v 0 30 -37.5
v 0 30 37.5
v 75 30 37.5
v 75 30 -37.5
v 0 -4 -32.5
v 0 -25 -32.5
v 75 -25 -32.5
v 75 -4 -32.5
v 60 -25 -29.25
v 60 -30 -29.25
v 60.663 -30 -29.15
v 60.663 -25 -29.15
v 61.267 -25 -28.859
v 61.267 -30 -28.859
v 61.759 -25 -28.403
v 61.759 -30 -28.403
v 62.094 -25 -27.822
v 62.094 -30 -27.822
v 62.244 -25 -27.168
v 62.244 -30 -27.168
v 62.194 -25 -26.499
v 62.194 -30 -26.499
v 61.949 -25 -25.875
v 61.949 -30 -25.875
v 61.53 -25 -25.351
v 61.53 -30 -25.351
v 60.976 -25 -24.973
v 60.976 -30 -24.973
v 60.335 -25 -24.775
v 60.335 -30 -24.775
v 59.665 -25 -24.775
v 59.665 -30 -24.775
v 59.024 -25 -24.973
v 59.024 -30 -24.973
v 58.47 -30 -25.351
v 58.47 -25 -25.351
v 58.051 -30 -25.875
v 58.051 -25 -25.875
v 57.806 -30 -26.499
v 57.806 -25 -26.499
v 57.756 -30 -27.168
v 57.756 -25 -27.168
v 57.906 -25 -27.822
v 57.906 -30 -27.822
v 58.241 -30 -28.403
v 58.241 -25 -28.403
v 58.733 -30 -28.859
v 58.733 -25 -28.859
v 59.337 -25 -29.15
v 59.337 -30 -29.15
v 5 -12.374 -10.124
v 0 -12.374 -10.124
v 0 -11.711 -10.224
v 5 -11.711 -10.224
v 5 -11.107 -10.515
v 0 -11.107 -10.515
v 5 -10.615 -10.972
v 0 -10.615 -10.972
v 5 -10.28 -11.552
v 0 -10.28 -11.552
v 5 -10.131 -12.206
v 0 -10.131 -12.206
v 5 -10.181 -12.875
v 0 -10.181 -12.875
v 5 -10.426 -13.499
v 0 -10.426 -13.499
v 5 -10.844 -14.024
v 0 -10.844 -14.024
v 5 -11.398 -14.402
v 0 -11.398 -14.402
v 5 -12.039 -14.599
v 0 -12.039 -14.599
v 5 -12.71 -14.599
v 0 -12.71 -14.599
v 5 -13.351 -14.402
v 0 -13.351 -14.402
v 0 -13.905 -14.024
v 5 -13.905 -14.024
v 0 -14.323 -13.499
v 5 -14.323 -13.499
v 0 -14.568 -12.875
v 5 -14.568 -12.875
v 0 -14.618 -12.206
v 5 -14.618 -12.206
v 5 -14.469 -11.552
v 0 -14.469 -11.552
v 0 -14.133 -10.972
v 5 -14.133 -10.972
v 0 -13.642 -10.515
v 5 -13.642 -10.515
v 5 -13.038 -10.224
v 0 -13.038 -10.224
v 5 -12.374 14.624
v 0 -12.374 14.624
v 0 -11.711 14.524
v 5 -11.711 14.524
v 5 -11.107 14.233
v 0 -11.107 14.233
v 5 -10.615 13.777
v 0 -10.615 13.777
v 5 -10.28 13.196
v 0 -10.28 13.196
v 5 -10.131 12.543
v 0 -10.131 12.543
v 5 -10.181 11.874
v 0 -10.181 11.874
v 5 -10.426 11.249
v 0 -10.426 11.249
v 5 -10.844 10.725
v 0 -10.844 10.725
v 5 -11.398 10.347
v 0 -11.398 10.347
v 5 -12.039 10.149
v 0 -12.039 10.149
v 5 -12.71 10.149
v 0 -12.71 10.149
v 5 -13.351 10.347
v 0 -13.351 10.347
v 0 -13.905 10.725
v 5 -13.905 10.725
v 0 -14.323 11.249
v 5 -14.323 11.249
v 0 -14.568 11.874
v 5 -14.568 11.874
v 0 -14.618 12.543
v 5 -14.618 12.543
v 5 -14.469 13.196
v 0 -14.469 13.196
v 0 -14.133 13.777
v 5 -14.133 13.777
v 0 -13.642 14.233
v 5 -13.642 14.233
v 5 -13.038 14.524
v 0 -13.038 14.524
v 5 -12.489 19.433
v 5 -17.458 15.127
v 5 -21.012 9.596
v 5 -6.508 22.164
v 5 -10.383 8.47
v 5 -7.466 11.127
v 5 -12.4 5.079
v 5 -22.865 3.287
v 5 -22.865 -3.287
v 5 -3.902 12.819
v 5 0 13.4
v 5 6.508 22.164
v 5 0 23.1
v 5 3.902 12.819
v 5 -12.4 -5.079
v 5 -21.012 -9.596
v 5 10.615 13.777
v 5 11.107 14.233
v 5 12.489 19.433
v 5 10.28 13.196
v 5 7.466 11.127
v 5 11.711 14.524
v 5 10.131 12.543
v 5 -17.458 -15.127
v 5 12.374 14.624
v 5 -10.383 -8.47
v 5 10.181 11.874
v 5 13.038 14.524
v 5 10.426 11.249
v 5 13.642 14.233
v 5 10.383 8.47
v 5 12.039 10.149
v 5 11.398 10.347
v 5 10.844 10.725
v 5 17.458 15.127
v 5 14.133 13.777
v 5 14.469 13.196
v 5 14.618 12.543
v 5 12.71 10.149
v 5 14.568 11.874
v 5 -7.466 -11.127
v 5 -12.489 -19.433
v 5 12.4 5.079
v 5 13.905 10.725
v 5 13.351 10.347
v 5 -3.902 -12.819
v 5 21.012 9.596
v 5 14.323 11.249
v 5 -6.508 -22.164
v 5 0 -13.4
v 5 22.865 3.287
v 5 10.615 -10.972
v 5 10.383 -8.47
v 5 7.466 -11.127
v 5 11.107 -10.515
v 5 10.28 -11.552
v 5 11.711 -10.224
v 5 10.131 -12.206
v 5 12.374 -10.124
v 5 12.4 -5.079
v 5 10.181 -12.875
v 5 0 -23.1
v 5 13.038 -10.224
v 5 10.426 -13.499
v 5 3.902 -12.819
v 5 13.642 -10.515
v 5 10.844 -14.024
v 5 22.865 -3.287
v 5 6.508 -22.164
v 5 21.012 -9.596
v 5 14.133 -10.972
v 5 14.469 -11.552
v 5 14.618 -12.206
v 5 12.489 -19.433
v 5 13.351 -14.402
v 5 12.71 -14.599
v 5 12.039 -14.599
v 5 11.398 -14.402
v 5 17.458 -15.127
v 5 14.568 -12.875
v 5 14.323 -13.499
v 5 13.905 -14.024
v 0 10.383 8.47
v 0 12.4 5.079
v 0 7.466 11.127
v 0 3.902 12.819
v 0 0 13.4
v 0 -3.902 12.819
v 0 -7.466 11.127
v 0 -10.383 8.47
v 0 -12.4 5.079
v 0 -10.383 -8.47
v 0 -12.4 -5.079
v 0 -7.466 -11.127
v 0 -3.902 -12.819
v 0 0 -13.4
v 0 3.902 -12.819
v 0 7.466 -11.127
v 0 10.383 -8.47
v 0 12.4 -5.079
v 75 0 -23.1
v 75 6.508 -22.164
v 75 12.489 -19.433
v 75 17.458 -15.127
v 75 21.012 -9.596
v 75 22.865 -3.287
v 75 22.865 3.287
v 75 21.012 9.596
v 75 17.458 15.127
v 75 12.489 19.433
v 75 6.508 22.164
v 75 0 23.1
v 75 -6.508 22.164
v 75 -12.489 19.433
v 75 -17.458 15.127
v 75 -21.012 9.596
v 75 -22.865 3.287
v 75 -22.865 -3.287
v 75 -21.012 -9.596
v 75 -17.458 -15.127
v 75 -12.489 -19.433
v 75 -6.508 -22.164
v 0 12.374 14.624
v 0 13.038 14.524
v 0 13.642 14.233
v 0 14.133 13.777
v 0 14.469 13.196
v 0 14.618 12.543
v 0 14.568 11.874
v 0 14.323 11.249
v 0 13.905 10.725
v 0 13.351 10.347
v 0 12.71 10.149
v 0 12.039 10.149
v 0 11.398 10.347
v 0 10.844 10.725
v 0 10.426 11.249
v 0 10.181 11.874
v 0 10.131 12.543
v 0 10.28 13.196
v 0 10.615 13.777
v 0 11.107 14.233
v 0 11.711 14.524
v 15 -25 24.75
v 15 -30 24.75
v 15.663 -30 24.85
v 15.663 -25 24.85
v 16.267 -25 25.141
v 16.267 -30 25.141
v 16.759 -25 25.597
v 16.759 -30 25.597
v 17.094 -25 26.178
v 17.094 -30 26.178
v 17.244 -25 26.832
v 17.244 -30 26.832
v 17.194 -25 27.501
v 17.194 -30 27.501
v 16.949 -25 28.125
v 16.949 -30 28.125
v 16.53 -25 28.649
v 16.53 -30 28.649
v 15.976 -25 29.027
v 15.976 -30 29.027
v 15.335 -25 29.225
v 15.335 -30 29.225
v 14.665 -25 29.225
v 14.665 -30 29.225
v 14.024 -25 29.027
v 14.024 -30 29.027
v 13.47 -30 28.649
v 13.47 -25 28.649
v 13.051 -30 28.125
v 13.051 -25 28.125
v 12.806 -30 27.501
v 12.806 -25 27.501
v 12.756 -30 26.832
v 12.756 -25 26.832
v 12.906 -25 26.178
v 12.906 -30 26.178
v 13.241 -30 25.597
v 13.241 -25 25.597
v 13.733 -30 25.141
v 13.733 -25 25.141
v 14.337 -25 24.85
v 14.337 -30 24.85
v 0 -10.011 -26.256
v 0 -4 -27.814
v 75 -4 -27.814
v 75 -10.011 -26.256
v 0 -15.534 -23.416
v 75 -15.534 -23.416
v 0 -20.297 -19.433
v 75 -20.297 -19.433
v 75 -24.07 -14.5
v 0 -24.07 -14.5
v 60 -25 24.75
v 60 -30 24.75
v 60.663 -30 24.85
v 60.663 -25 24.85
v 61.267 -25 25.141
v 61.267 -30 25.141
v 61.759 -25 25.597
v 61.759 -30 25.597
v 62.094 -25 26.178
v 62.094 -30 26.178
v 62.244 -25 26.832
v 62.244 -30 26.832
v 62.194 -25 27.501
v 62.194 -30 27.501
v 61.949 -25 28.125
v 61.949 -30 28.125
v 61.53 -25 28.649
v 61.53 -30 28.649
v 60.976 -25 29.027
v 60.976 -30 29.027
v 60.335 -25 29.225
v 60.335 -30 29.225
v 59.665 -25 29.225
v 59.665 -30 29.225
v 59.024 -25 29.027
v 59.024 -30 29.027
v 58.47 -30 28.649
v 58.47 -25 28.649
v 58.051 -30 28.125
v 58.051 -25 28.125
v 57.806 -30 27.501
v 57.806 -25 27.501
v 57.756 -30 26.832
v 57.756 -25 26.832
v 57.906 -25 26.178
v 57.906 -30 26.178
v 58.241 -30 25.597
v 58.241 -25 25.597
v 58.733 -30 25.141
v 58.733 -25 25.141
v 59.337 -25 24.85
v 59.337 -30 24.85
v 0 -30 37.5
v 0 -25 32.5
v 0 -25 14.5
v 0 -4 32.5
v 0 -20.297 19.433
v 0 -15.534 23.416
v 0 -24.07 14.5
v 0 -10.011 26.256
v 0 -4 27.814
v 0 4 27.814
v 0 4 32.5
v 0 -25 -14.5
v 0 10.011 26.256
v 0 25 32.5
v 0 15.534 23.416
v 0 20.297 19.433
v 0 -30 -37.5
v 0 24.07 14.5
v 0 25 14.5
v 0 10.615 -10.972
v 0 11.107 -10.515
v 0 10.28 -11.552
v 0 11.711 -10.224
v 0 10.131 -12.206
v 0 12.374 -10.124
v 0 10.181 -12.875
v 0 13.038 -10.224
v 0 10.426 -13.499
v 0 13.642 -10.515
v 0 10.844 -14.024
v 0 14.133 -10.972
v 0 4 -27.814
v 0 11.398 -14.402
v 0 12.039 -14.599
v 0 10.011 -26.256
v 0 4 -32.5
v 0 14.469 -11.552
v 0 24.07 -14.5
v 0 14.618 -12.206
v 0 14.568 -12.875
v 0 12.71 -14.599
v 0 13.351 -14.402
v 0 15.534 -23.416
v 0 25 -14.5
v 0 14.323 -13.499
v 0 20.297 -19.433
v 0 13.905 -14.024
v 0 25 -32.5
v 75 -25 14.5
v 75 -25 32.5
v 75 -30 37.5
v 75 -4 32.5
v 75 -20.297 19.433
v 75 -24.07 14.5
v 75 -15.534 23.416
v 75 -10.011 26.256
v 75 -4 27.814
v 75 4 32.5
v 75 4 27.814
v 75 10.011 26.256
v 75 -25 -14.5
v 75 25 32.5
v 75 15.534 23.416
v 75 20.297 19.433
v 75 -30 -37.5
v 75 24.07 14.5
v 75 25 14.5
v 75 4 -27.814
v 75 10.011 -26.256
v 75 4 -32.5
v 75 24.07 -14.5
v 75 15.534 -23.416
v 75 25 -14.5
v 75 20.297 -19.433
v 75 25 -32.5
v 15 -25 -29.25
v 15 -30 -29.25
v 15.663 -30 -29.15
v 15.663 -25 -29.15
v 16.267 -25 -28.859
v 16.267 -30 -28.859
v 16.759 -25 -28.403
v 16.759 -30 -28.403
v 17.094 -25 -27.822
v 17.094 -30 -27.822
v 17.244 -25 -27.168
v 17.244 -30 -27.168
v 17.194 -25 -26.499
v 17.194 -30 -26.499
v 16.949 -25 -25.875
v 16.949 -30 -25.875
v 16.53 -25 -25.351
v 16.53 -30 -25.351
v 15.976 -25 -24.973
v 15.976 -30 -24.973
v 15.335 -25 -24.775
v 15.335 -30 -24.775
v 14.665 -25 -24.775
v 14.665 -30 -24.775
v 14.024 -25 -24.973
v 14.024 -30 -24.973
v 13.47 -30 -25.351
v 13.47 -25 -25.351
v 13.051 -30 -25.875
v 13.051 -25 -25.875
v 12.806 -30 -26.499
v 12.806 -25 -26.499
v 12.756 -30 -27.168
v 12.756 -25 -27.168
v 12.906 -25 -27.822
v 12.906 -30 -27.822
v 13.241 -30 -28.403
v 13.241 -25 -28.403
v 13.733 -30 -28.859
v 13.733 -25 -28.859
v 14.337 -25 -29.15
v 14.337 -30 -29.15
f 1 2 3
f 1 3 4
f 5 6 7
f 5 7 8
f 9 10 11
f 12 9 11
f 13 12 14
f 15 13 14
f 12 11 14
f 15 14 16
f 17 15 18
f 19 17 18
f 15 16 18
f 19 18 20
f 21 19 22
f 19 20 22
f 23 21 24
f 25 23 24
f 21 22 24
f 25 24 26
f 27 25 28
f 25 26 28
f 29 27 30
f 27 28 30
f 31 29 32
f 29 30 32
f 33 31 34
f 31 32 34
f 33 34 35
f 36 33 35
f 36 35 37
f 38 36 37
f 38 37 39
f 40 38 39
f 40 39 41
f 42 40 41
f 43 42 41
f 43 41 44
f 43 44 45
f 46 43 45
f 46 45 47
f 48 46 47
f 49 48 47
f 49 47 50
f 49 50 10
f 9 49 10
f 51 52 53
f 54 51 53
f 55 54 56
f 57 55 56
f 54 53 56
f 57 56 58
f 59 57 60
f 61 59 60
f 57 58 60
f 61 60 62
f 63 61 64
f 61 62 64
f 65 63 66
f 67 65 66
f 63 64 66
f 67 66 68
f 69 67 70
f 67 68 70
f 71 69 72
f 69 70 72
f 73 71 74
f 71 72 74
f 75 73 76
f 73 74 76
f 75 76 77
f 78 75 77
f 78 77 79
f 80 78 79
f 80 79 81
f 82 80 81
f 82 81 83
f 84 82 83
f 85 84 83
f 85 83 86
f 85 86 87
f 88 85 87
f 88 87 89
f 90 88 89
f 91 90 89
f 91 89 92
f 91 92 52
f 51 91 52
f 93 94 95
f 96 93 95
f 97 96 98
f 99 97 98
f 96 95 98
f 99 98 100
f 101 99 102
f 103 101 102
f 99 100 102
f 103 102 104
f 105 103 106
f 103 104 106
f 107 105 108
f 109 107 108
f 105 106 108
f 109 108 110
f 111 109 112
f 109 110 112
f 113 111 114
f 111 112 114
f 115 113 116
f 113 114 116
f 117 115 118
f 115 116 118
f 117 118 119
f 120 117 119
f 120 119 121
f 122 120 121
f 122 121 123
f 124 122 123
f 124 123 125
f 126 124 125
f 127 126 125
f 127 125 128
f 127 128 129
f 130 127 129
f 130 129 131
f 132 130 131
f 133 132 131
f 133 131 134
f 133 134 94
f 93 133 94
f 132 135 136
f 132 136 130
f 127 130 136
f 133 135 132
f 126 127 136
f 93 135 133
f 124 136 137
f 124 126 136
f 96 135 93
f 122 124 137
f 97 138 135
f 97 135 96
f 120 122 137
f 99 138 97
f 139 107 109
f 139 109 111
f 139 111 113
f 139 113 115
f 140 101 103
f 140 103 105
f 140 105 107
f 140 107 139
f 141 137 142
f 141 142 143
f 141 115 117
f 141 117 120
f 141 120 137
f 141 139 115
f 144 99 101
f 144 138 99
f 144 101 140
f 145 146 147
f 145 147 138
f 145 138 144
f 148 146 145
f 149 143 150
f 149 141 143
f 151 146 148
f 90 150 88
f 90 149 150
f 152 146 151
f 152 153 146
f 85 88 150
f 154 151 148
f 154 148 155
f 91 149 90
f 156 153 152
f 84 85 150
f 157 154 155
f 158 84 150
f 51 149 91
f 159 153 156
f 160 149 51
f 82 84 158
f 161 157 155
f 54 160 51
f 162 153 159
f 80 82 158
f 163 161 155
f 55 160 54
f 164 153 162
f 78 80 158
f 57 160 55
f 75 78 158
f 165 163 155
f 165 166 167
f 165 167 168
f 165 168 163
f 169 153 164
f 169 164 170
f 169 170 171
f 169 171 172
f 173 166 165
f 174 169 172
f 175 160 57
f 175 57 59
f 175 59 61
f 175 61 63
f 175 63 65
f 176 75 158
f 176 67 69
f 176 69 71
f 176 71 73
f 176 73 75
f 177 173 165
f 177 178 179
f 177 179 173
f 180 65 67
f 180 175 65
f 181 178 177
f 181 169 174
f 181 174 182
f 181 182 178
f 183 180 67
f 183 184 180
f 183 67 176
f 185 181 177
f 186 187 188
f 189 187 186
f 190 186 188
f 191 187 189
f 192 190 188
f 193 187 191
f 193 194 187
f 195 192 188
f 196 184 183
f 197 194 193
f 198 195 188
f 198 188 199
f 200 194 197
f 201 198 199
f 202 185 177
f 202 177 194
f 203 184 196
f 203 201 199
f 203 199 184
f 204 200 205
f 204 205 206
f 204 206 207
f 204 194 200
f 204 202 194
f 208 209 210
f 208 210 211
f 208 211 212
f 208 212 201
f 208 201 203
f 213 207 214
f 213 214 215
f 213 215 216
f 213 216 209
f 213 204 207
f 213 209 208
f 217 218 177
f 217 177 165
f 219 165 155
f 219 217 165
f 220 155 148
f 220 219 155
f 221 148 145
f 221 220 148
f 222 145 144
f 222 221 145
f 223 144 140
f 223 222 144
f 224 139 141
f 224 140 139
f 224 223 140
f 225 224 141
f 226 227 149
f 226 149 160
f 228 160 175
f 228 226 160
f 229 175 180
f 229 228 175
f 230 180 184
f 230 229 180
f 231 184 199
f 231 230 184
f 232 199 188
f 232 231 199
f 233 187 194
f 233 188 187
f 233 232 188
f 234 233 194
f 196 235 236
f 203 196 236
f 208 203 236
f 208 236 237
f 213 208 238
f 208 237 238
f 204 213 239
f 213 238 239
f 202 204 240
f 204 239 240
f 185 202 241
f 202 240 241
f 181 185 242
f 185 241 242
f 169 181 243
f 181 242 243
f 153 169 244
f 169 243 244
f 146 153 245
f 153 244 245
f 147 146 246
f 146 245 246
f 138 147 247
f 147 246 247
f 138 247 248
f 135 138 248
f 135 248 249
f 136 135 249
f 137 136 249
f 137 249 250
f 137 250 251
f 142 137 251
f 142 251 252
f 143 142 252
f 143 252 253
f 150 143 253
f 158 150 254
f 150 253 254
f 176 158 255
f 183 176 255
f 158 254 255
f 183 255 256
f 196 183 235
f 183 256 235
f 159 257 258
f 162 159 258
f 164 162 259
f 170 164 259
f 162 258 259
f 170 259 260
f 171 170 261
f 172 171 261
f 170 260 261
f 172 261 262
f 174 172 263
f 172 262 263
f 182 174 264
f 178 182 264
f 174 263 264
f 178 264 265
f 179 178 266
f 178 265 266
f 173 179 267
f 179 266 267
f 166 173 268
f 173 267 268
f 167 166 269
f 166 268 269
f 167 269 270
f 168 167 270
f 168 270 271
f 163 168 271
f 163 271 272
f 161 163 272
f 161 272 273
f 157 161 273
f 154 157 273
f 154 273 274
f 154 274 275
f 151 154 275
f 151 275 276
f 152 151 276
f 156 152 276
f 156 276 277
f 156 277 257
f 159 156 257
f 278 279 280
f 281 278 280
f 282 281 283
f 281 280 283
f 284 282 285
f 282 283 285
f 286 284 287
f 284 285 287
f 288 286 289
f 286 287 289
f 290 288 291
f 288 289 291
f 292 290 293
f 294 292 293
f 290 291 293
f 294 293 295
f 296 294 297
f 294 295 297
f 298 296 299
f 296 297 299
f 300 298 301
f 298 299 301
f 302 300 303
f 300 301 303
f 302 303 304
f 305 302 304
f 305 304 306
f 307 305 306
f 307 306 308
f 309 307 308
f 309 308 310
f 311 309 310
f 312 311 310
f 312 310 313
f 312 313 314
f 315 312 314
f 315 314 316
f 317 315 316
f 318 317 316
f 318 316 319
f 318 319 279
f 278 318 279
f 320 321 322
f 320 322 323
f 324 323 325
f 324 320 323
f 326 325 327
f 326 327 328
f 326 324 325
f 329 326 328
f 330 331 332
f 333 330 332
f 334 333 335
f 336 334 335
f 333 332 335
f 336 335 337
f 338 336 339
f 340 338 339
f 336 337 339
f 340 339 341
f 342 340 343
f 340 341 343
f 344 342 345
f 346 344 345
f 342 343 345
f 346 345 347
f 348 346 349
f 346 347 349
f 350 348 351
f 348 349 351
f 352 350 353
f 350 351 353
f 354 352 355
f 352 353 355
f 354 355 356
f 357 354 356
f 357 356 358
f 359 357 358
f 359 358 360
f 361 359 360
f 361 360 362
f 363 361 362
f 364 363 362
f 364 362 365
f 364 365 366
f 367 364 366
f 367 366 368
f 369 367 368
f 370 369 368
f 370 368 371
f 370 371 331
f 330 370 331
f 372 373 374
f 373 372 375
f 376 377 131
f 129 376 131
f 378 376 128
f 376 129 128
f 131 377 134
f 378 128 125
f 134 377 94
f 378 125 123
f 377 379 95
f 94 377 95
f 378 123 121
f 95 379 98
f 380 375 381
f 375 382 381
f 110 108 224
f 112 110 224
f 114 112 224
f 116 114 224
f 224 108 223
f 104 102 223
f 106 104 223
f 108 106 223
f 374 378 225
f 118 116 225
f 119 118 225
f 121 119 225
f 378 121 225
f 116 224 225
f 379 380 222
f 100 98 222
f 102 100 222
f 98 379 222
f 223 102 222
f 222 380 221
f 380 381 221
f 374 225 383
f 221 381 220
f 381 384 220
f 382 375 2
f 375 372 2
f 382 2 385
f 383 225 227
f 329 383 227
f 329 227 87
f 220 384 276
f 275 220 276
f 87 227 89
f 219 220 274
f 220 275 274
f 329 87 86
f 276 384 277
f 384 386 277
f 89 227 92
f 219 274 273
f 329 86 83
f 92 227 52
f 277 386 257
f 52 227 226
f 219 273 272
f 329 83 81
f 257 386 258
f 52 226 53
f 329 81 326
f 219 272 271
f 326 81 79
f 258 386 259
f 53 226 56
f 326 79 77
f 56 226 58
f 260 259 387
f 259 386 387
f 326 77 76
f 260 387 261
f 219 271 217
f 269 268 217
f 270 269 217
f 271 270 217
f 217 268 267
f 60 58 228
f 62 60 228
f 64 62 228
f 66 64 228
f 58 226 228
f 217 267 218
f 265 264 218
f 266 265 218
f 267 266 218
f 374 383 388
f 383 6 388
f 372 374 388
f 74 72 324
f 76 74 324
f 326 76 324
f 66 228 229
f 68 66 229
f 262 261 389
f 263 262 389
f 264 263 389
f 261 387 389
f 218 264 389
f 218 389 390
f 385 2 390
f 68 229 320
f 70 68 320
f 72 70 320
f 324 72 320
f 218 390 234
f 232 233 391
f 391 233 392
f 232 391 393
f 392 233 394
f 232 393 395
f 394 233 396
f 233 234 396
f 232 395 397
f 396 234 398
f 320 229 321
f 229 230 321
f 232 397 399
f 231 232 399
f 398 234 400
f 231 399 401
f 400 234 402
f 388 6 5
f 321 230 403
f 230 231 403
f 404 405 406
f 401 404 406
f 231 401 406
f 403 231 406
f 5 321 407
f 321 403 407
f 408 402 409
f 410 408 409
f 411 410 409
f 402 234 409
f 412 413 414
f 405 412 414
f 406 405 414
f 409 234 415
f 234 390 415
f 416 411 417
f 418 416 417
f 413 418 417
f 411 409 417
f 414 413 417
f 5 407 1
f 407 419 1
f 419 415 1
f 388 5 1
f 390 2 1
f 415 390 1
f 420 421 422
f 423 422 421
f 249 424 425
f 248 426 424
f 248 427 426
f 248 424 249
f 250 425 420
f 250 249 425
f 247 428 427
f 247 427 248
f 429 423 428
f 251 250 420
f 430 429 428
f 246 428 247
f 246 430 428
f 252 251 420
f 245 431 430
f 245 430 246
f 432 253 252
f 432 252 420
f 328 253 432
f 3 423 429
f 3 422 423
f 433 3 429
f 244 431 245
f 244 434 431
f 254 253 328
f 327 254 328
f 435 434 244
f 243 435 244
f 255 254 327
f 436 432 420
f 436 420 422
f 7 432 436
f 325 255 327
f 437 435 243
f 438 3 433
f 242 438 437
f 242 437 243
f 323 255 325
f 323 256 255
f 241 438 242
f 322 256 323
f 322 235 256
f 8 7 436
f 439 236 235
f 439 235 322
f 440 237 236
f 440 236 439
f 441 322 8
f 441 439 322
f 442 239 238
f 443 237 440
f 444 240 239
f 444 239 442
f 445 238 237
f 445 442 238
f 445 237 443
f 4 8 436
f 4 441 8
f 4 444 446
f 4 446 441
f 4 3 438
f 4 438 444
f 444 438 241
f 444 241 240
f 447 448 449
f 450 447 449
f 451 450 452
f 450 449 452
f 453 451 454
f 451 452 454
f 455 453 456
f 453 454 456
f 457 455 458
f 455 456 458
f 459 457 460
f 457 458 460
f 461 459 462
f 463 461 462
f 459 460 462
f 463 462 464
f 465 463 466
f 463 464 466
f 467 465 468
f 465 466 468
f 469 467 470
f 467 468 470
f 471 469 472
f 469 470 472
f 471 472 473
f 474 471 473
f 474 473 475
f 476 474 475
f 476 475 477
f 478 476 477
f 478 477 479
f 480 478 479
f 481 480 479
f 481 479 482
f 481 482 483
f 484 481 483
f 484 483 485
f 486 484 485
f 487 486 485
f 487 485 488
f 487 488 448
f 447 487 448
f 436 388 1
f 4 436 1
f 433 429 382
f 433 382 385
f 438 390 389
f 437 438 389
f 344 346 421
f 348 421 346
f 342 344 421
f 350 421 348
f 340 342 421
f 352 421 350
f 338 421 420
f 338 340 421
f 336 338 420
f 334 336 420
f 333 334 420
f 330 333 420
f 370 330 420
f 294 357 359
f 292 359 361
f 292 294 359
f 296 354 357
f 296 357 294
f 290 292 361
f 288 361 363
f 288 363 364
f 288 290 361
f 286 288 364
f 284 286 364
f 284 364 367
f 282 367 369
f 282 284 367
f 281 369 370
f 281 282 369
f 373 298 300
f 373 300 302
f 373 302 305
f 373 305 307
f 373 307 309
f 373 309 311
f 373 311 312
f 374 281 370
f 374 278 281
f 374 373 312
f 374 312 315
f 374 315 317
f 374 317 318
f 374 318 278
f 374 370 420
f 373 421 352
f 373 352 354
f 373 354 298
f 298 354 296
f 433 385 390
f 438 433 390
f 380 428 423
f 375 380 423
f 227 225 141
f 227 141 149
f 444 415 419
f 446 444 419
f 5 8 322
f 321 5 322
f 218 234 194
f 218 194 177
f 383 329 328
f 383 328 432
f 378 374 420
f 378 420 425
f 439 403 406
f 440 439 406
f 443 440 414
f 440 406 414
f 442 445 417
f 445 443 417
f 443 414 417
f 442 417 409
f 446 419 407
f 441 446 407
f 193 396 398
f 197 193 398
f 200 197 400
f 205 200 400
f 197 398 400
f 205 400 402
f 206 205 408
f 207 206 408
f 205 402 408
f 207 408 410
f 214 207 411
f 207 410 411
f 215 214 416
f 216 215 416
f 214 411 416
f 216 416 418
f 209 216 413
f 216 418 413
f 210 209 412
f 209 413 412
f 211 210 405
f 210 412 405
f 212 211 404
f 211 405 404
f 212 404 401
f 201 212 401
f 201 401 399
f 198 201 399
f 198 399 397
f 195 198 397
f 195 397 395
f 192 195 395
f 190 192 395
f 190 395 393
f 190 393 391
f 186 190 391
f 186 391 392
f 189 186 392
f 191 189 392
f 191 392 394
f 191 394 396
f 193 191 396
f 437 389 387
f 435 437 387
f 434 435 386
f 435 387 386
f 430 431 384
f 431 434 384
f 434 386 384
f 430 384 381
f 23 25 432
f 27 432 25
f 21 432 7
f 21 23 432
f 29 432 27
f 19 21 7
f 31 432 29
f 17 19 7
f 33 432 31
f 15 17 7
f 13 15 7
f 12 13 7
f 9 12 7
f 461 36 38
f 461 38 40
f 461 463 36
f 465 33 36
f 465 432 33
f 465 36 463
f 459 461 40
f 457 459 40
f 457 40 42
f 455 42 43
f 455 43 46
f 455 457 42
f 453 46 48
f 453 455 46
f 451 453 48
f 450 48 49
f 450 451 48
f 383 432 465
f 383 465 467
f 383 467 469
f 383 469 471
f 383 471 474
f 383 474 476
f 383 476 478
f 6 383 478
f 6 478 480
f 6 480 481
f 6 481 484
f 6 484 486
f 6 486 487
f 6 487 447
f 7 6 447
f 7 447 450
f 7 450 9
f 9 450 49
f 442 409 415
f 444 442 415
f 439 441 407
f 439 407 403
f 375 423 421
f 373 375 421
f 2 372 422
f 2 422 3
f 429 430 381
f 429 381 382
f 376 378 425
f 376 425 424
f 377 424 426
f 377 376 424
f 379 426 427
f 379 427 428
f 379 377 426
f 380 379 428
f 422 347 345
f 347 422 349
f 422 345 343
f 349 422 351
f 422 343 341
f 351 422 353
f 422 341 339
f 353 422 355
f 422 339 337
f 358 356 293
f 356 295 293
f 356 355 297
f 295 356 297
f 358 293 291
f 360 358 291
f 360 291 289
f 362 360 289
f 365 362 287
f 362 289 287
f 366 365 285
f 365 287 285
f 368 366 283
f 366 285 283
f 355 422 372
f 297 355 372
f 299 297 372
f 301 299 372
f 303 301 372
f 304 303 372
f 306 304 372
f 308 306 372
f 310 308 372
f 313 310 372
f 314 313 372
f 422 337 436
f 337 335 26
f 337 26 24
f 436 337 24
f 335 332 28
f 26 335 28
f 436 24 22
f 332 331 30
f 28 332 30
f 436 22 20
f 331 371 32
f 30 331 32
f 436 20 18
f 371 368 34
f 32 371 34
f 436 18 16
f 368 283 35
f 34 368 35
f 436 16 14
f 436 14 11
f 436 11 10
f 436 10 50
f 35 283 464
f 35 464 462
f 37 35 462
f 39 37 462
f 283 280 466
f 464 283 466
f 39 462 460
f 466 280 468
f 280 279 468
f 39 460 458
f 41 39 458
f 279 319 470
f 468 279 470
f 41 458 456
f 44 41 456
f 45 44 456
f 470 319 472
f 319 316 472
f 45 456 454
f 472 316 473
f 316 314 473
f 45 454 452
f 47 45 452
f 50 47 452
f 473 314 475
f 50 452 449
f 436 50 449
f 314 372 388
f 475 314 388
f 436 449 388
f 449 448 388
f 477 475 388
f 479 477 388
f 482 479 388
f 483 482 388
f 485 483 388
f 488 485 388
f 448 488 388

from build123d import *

# Parameters (mm, degrees)
SKETCH1_W           = 75
SKETCH1_H           = 60
BOSS_EXTRUDE1_DEPTH = 75
SKETCH2_R           = 23.1
CUT_EXTRUDE1_DEPTH  = 70
SKETCH3_R           = 2.25
CUT_EXTRUDE2_DEPTH  = 90.057565653
CUT_EXTRUDE3_REACH  = 105.108
SKETCH4_R           = 2.25


with BuildPart() as part:
    # Sketch1 → Boss-Extrude1 (new body)
    with BuildSketch(Plane(origin=(0, 0, 0), x_dir=(0, 0, -1), z_dir=(1, 0, 0))):
        Rectangle(SKETCH1_W, SKETCH1_H)
    extrude(amount=BOSS_EXTRUDE1_DEPTH)

    # Sketch2 → Cut-Extrude1 (cut)
    with BuildSketch(Plane(origin=(75, 0, 0), x_dir=(0, 0, -1), z_dir=(1, 0, 0))):
        Circle(SKETCH2_R)
    extrude(amount=-CUT_EXTRUDE1_DEPTH, mode=Mode.SUBTRACT)

    # Sketch3 → Cut-Extrude2 (cut, through all)
    with BuildSketch(Plane.ZY):
        with Locations((-12.374368671, 12.374368671)):
            Circle(SKETCH3_R)
        with Locations((12.374368671, 12.374368671)):
            Circle(SKETCH3_R)
        with Locations((12.374368671, -12.374368671)):
            Circle(SKETCH3_R)
        with Locations((-12.374368671, -12.374368671)):
            Circle(SKETCH3_R)
        with BuildLine():
            Line((-5.07937004, 12.4), (5.07937004, 12.4))
            ThreePointArc((5.07937004, 12.4), (13.4, 0), (5.07937004, -12.4))
            Line((5.07937004, -12.4), (-5.07937004, -12.4))
            ThreePointArc((-5.07937004, -12.4), (-13.4, 0), (-5.07937004, 12.4))
        make_face()
        with BuildLine():
            Line((32.5, -25), (14.5, -25))
            Line((14.5, -25), (14.5, -24.069898213))
            ThreePointArc((14.5, -24.069898213), (23.416139376, -15.533654327), (27.813845473, -4))
            Line((27.813845473, -4), (32.5, -4))
            Line((32.5, -4), (32.5, -25))
        make_face()
        with BuildLine():
            Line((32.5, 25), (14.5, 25))
            Line((14.5, 25), (14.5, 24.069898213))
            ThreePointArc((14.5, 24.069898213), (23.416139376, 15.533654327), (27.813845473, 4))
            Line((27.813845473, 4), (32.5, 4))
            Line((32.5, 4), (32.5, 25))
        make_face()
        with BuildLine():
            Line((-32.5, -25), (-32.5, -4))
            Line((-32.5, -4), (-27.813845473, -4))
            ThreePointArc((-27.813845473, -4), (-23.416139376, -15.533654327), (-14.5, -24.069898213))
            Line((-14.5, -24.069898213), (-14.5, -25))
            Line((-14.5, -25), (-32.5, -25))
        make_face()
        with BuildLine():
            Line((-32.5, 4), (-27.813845473, 4))
            ThreePointArc((-27.813845473, 4), (-23.416139376, 15.533654327), (-14.5, 24.069898213))
            Line((-14.5, 24.069898213), (-14.5, 25))
            Line((-14.5, 25), (-32.5, 25))
            Line((-32.5, 25), (-32.5, 4))
        make_face()
    extrude(amount=-CUT_EXTRUDE2_DEPTH, mode=Mode.SUBTRACT)

    # Sketch4 → Cut-Extrude3 (cut, up to next)
    with BuildSketch(Plane.XZ.offset(30), mode=Mode.PRIVATE) as cut_extrude3_sk1:
        with Locations(Location((60, 27, 0), (0, 0, 270))):
            Circle(SKETCH4_R)
    cut_extrude3_tool1 = extrude(cut_extrude3_sk1.sketch, amount=-CUT_EXTRUDE3_REACH, mode=Mode.PRIVATE) & part.part
    # Sketch4 → Cut-Extrude3 (cut, up to next)
    with BuildSketch(Plane.XZ.offset(30), mode=Mode.PRIVATE) as cut_extrude3_sk2:
        with Locations(Location((15, 27, 0), (0, 0, 270))):
            Circle(SKETCH4_R)
    cut_extrude3_tool2 = extrude(cut_extrude3_sk2.sketch, amount=-CUT_EXTRUDE3_REACH, mode=Mode.PRIVATE) & part.part
    # Sketch4 → Cut-Extrude3 (cut, up to next)
    with BuildSketch(Plane.XZ.offset(30), mode=Mode.PRIVATE) as cut_extrude3_sk3:
        with Locations(Location((60, -27, 0), (0, 0, 270))):
            Circle(SKETCH4_R)
    cut_extrude3_tool3 = extrude(cut_extrude3_sk3.sketch, amount=-CUT_EXTRUDE3_REACH, mode=Mode.PRIVATE) & part.part
    # Sketch4 → Cut-Extrude3 (cut, up to next)
    with BuildSketch(Plane.XZ.offset(30), mode=Mode.PRIVATE) as cut_extrude3_sk4:
        with Locations(Location((15, -27, 0), (0, 0, 270))):
            Circle(SKETCH4_R)
    cut_extrude3_tool4 = extrude(cut_extrude3_sk4.sketch, amount=-CUT_EXTRUDE3_REACH, mode=Mode.PRIVATE) & part.part
    add(cut_extrude3_tool1.solids().sort_by_distance((60, -30, 27))[0], mode=Mode.SUBTRACT)
    add(cut_extrude3_tool2.solids().sort_by_distance((15, -30, 27))[0], mode=Mode.SUBTRACT)
    add(cut_extrude3_tool3.solids().sort_by_distance((60, -30, -27))[0], mode=Mode.SUBTRACT)
    add(cut_extrude3_tool4.solids().sort_by_distance((15, -30, -27))[0], mode=Mode.SUBTRACT)


solid = part.part
